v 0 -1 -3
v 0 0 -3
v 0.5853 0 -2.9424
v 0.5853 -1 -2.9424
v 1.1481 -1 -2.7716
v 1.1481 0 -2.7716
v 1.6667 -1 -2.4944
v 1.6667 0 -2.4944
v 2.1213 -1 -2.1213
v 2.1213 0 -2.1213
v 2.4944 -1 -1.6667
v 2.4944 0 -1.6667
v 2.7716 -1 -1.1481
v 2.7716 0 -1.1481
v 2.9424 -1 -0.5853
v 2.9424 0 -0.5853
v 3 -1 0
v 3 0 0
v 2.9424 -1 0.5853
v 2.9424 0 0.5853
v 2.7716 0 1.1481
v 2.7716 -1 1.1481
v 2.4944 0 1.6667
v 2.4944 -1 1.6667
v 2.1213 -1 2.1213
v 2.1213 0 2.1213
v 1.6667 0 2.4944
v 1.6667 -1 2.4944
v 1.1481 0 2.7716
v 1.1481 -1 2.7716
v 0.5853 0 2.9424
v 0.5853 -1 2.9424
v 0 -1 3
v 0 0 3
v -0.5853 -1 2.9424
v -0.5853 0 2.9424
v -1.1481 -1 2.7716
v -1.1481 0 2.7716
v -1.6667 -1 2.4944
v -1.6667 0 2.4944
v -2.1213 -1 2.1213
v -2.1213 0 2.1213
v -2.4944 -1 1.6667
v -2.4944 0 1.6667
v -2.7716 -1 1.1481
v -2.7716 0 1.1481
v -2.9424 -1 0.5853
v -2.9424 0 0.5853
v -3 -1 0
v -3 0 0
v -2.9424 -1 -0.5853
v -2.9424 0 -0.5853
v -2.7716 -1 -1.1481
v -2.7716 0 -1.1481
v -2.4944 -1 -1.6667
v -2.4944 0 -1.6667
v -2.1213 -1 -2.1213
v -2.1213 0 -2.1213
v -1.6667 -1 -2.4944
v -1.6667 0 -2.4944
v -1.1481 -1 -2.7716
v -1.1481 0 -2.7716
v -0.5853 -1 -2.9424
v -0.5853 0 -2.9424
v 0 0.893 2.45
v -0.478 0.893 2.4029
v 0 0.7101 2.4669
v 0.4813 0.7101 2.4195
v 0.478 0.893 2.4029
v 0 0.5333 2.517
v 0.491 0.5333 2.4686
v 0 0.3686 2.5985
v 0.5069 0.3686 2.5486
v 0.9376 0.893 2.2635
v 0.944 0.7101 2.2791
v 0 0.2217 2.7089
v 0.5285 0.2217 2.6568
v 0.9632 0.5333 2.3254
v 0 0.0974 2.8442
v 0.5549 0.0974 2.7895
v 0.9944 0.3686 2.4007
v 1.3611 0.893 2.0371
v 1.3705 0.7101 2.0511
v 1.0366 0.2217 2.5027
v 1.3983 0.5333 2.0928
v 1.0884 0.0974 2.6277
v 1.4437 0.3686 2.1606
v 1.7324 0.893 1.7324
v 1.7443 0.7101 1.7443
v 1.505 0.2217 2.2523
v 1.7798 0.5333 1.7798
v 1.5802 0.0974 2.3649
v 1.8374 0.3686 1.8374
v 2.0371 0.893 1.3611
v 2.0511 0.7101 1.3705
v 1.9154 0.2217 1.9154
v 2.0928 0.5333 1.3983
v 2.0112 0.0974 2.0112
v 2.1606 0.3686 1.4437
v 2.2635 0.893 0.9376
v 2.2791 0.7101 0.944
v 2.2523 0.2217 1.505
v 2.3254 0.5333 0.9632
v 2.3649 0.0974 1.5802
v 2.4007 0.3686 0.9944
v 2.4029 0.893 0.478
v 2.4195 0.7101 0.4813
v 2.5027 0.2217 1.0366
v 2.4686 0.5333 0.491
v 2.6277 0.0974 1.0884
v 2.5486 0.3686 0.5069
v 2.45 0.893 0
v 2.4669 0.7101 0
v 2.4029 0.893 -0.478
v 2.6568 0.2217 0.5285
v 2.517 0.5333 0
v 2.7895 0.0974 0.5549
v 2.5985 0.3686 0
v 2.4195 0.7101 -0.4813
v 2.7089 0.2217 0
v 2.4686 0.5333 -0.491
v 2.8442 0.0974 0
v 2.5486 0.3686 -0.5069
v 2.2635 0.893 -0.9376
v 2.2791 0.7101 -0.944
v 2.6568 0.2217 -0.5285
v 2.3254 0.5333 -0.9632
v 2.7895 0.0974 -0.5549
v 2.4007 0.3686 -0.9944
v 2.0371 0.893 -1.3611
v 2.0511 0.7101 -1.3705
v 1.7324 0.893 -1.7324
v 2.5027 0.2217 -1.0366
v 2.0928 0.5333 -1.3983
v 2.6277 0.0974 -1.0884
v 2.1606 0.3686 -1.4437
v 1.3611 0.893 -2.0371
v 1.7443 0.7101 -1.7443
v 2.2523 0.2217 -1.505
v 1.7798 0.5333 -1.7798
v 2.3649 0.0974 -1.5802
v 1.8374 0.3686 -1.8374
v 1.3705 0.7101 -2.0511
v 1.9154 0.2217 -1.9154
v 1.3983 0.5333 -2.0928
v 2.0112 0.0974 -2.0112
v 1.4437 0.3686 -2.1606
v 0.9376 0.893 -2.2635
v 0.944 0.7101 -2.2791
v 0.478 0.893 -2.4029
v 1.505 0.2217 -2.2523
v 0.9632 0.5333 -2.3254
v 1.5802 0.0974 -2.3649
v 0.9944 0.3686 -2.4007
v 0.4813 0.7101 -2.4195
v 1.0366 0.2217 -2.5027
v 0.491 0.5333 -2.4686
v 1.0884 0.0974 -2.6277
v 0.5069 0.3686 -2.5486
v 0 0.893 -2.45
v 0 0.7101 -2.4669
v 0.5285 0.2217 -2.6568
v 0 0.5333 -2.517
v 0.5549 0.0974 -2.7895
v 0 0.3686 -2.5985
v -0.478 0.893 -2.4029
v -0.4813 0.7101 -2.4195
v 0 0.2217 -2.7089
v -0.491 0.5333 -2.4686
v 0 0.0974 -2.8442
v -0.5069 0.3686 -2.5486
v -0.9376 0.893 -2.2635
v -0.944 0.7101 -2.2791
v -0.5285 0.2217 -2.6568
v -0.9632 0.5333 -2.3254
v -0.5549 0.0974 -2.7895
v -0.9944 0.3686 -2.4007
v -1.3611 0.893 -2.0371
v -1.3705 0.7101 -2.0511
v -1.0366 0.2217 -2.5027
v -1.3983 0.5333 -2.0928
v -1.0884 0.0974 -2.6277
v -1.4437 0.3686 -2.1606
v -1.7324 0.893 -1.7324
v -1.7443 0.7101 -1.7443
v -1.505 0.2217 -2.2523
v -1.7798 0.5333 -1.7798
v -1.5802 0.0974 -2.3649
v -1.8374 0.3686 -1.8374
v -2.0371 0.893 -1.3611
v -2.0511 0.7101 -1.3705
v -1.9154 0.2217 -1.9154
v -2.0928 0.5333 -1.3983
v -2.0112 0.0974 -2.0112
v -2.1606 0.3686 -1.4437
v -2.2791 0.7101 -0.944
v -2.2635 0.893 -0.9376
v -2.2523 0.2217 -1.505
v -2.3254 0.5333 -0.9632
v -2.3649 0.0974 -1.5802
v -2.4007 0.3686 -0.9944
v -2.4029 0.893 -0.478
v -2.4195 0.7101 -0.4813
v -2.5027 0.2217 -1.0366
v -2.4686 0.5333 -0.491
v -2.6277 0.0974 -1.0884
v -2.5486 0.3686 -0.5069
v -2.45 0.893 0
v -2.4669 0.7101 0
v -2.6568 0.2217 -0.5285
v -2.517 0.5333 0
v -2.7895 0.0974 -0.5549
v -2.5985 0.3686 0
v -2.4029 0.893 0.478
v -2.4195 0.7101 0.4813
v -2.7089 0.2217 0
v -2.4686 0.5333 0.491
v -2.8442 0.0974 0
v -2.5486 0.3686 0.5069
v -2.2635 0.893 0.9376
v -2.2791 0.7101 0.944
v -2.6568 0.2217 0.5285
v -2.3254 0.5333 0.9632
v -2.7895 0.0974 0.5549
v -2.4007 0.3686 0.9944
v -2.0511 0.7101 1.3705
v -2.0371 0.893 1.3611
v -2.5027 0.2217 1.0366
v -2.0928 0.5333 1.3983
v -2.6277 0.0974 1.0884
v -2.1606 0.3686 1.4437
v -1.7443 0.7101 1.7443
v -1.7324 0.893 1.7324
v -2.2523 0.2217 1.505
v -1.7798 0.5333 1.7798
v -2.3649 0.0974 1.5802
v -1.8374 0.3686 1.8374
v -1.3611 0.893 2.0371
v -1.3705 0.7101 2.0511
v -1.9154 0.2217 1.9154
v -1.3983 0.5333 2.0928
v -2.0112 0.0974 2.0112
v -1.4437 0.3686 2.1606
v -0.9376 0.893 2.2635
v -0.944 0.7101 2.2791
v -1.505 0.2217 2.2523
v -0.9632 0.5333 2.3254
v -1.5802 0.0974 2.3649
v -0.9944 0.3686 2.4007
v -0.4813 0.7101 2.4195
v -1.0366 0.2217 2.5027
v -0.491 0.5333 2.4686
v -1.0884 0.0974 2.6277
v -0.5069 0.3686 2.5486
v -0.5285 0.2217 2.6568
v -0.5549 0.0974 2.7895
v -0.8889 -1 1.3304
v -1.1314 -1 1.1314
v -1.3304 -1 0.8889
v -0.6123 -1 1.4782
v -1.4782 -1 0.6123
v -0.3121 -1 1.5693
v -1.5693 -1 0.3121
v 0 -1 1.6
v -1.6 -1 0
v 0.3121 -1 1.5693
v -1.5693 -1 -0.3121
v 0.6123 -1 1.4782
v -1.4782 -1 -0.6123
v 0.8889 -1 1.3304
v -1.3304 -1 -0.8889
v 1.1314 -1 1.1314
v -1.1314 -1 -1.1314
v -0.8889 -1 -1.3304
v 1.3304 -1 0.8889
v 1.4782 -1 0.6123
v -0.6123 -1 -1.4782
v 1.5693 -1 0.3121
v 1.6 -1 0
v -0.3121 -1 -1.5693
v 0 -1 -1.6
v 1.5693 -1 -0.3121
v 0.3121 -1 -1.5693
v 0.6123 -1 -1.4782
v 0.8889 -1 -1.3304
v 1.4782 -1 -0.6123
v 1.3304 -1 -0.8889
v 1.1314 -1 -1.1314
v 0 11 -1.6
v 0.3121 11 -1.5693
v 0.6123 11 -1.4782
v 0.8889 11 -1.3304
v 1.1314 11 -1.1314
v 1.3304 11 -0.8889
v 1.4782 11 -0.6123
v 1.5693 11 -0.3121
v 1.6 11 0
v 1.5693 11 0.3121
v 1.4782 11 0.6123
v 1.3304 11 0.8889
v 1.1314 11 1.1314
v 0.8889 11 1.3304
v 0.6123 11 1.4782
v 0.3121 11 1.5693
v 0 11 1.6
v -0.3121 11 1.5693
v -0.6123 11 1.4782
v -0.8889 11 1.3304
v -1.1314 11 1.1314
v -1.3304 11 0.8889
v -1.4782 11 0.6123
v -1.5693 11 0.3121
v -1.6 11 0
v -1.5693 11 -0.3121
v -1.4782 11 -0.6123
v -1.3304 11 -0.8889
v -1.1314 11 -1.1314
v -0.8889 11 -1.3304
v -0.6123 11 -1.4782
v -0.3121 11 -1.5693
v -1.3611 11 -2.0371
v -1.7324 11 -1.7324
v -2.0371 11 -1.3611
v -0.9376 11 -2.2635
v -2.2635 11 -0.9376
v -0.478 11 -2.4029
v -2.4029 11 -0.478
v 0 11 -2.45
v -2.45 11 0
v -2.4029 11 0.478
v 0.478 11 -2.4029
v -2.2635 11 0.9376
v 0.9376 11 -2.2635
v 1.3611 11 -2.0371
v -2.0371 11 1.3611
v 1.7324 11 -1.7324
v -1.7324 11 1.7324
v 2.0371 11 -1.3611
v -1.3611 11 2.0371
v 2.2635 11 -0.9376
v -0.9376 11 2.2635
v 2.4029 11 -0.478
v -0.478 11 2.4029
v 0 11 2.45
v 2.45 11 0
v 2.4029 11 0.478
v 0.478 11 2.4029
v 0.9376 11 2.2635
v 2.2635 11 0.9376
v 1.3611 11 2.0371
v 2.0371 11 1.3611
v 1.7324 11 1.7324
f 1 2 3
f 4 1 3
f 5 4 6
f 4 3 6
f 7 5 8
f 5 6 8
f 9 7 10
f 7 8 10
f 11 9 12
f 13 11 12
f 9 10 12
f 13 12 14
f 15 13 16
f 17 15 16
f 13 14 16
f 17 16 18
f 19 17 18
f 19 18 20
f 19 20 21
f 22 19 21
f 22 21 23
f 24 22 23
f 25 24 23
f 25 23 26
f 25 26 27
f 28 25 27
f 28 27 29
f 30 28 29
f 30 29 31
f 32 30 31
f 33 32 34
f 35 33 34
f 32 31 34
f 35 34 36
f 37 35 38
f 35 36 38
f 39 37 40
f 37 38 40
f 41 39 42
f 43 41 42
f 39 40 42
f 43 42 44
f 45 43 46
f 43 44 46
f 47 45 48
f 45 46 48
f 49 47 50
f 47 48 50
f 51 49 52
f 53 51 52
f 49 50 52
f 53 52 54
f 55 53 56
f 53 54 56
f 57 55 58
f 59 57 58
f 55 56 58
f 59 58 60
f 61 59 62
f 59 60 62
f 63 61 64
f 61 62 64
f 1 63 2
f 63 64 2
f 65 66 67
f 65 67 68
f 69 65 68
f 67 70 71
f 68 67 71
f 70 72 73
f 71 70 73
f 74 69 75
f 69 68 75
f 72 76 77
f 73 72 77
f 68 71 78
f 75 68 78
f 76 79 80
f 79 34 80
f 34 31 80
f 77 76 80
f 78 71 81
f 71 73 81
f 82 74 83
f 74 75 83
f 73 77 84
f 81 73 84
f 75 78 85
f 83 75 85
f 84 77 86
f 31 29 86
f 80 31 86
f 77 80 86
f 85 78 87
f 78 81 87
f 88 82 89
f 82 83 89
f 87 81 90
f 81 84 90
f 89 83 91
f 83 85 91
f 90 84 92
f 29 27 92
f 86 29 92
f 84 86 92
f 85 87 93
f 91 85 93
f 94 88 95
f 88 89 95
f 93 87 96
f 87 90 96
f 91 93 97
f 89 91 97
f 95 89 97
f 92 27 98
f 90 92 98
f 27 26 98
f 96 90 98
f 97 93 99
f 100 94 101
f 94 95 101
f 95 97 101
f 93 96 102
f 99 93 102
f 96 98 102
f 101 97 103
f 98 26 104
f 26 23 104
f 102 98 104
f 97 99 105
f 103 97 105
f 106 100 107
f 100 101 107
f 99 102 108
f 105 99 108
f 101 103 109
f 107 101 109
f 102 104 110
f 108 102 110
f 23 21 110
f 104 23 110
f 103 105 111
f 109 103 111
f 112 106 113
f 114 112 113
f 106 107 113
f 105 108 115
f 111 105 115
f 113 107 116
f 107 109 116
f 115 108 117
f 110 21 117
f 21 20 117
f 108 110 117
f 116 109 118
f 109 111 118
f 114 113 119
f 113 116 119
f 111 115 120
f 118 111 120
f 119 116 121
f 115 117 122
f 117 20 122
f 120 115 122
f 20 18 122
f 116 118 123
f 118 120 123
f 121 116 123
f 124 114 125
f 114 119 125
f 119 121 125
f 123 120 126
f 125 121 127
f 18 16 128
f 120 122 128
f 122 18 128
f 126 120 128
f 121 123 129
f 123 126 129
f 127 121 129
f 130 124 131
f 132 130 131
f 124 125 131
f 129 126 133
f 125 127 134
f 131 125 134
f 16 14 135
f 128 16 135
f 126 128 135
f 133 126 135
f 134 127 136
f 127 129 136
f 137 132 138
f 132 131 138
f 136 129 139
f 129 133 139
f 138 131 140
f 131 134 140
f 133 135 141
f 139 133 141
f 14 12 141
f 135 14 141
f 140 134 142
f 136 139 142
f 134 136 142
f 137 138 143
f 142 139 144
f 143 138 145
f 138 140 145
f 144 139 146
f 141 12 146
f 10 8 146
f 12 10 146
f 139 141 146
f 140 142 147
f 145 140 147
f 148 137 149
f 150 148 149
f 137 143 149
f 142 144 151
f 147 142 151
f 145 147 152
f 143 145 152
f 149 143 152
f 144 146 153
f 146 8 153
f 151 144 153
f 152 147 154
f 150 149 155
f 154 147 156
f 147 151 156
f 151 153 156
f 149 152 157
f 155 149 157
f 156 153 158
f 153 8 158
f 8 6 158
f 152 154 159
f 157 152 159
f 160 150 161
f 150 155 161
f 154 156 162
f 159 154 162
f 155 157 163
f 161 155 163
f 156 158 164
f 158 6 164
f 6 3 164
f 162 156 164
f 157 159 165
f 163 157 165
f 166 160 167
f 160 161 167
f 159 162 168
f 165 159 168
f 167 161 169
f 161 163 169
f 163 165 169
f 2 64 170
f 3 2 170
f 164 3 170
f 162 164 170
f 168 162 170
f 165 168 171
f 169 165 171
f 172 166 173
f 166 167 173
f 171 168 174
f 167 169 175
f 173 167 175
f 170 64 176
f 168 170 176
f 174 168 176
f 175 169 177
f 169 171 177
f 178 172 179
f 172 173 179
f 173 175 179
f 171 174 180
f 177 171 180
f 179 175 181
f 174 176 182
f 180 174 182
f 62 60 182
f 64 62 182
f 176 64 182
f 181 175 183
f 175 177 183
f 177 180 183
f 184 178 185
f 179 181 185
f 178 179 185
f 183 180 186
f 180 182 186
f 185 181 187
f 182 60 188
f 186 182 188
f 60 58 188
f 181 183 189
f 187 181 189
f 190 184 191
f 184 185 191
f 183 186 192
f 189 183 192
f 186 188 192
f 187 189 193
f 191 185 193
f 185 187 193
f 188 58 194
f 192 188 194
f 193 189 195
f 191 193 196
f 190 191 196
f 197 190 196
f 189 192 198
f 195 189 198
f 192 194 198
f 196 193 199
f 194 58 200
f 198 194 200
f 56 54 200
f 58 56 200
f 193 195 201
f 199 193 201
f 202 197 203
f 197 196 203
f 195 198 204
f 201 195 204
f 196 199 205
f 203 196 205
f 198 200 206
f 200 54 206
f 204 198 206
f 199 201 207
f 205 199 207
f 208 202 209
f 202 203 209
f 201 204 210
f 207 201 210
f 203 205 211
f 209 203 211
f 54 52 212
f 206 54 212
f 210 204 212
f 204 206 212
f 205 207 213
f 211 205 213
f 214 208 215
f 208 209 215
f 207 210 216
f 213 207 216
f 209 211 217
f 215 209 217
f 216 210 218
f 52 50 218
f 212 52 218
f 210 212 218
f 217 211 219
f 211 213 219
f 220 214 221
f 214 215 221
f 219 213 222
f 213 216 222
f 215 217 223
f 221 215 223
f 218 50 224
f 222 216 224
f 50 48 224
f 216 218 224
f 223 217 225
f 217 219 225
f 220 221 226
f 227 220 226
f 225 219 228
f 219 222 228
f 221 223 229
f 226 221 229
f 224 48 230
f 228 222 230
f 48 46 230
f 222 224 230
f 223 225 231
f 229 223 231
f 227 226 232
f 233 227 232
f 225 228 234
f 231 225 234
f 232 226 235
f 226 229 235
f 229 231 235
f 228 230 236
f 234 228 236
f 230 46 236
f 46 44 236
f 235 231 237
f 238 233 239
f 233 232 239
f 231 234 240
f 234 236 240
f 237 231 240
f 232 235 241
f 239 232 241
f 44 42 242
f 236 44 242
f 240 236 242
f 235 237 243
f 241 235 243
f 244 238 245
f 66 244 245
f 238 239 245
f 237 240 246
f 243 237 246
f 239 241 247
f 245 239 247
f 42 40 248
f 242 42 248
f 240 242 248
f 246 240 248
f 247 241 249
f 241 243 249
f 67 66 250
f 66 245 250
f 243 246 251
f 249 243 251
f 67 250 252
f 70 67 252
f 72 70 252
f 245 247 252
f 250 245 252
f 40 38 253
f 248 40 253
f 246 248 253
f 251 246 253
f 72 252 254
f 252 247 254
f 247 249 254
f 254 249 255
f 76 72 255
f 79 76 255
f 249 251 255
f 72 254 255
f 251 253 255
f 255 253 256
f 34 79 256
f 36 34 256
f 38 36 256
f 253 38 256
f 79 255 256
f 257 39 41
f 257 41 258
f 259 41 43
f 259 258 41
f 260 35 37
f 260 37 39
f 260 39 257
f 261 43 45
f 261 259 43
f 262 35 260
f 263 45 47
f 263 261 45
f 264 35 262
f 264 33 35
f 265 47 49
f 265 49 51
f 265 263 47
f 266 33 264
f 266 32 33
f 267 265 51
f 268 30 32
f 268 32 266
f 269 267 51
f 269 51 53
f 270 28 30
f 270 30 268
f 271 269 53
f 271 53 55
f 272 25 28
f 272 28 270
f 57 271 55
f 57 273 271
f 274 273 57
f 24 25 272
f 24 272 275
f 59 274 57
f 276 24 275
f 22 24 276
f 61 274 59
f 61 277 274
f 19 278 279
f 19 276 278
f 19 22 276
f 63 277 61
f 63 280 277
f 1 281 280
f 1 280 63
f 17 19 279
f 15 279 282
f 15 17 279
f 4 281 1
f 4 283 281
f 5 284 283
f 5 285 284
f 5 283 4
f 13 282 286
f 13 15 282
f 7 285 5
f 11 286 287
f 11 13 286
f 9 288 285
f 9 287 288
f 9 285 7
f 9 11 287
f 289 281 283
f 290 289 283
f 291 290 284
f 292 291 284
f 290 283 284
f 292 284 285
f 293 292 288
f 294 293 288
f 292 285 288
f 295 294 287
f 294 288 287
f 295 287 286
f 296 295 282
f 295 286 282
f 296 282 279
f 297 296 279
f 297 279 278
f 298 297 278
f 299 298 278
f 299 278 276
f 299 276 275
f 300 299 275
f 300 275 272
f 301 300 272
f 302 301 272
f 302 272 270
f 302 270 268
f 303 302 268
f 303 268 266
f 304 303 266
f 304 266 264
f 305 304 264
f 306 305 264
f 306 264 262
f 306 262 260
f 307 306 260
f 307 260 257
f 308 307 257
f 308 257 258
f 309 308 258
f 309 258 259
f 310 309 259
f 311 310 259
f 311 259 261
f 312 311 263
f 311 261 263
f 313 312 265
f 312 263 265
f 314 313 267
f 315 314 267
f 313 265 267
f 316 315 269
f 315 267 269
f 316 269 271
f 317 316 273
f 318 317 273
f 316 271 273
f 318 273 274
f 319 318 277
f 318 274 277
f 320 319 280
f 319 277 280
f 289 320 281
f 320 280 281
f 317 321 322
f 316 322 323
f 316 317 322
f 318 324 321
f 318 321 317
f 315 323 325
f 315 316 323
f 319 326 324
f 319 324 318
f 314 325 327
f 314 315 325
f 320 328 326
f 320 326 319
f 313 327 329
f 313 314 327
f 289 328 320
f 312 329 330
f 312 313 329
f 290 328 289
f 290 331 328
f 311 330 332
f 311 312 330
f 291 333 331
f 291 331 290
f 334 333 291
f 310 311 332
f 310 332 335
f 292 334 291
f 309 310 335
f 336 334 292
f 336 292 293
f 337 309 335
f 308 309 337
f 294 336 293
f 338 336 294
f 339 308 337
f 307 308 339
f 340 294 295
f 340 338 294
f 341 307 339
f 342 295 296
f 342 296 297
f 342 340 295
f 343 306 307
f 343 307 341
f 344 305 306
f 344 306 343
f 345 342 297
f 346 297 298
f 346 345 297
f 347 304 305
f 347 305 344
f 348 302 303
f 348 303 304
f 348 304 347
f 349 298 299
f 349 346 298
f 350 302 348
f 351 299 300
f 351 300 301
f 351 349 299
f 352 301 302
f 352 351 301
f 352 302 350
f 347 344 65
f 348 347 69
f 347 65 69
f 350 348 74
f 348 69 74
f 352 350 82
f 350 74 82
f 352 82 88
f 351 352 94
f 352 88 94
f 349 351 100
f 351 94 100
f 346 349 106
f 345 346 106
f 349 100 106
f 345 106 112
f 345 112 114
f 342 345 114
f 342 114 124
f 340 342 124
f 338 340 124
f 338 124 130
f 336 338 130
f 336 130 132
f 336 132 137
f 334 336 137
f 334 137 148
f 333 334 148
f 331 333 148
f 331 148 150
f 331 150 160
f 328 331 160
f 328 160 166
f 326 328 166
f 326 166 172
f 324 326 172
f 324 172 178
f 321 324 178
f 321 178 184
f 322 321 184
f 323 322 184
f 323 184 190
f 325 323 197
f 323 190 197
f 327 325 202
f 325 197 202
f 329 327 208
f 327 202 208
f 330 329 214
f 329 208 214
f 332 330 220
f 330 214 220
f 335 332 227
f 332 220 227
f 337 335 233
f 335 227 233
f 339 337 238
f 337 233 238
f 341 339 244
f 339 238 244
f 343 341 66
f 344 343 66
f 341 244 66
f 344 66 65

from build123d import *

# Parameters (mm, degrees)
SKETCH1_R           = 2.45
SKETCH1_R_2         = 1.5
BOSS_EXTRUDE1_DEPTH = 11
SKETCH2_R           = 3
BOSS_EXTRUDE2_DEPTH = 1
SKETCH3_R           = 1.6
CUT_EXTRUDE1_DEPTH  = 13.727922061
FILLET2_R           = 1


with BuildPart() as part:
    # Sketch1 → Boss-Extrude1 (new body)
    with BuildSketch(Plane(origin=(0, 0, 0), x_dir=(1, 0, 0), z_dir=(0, 1, 0))):
        with Locations(Location((0, 0, 0), (0, 0, 270))):
            Circle(SKETCH1_R)
        with Locations(Location((0, 0, 0), (0, 0, 270))):
            Circle(SKETCH1_R_2, mode=Mode.SUBTRACT)
    extrude(amount=BOSS_EXTRUDE1_DEPTH)

    # Sketch2 → Boss-Extrude2 (add)
    with BuildSketch(Plane(origin=(0, 0, 0), x_dir=(-1, 0, 0), z_dir=(0, -1, 0))):
        with Locations(Location((0, 0, 0), (0, 0, 90))):
            Circle(SKETCH2_R)
    extrude(amount=BOSS_EXTRUDE2_DEPTH)

    # Sketch3 → Cut-Extrude1 (cut, through all)
    with BuildSketch(Plane(origin=(0, -1, 0), x_dir=(-1, 0, 0), z_dir=(0, -1, 0))):
        with Locations(Location((0, 0, 0), (0, 0, 90))):
            Circle(SKETCH3_R)
    extrude(amount=-CUT_EXTRUDE1_DEPTH, mode=Mode.SUBTRACT)

    # Fillet2
    # the kernel refuses this fillet: 1 mm, written as the material it adds along each edge
    with BuildSketch(Plane(origin=(0, 0, 0), x_dir=(0, 0, 1), z_dir=(-1, 0, 0))) as fillet2_piece_1:
        with BuildLine():
            CenterArc((3.45, 0.893028555), FILLET2_R, 180, 63.25631605)
            Line((2.45, 0.893028555), (2.43, 0.893028555))
            Line((2.43, 0.893028555), (2.43, 0))
            Line((2.43, 0), (2.45, -0.02))
            ThreePointArc((2.45, -0.02), (2.725, -0.02), (2.991, -0.017860571))
            Line((2.991, -0.017860571), (3, 0))
        make_face()
    revolve(axis=Axis((0, 0, 0), (0, 1, 0)))


solid = part.part
